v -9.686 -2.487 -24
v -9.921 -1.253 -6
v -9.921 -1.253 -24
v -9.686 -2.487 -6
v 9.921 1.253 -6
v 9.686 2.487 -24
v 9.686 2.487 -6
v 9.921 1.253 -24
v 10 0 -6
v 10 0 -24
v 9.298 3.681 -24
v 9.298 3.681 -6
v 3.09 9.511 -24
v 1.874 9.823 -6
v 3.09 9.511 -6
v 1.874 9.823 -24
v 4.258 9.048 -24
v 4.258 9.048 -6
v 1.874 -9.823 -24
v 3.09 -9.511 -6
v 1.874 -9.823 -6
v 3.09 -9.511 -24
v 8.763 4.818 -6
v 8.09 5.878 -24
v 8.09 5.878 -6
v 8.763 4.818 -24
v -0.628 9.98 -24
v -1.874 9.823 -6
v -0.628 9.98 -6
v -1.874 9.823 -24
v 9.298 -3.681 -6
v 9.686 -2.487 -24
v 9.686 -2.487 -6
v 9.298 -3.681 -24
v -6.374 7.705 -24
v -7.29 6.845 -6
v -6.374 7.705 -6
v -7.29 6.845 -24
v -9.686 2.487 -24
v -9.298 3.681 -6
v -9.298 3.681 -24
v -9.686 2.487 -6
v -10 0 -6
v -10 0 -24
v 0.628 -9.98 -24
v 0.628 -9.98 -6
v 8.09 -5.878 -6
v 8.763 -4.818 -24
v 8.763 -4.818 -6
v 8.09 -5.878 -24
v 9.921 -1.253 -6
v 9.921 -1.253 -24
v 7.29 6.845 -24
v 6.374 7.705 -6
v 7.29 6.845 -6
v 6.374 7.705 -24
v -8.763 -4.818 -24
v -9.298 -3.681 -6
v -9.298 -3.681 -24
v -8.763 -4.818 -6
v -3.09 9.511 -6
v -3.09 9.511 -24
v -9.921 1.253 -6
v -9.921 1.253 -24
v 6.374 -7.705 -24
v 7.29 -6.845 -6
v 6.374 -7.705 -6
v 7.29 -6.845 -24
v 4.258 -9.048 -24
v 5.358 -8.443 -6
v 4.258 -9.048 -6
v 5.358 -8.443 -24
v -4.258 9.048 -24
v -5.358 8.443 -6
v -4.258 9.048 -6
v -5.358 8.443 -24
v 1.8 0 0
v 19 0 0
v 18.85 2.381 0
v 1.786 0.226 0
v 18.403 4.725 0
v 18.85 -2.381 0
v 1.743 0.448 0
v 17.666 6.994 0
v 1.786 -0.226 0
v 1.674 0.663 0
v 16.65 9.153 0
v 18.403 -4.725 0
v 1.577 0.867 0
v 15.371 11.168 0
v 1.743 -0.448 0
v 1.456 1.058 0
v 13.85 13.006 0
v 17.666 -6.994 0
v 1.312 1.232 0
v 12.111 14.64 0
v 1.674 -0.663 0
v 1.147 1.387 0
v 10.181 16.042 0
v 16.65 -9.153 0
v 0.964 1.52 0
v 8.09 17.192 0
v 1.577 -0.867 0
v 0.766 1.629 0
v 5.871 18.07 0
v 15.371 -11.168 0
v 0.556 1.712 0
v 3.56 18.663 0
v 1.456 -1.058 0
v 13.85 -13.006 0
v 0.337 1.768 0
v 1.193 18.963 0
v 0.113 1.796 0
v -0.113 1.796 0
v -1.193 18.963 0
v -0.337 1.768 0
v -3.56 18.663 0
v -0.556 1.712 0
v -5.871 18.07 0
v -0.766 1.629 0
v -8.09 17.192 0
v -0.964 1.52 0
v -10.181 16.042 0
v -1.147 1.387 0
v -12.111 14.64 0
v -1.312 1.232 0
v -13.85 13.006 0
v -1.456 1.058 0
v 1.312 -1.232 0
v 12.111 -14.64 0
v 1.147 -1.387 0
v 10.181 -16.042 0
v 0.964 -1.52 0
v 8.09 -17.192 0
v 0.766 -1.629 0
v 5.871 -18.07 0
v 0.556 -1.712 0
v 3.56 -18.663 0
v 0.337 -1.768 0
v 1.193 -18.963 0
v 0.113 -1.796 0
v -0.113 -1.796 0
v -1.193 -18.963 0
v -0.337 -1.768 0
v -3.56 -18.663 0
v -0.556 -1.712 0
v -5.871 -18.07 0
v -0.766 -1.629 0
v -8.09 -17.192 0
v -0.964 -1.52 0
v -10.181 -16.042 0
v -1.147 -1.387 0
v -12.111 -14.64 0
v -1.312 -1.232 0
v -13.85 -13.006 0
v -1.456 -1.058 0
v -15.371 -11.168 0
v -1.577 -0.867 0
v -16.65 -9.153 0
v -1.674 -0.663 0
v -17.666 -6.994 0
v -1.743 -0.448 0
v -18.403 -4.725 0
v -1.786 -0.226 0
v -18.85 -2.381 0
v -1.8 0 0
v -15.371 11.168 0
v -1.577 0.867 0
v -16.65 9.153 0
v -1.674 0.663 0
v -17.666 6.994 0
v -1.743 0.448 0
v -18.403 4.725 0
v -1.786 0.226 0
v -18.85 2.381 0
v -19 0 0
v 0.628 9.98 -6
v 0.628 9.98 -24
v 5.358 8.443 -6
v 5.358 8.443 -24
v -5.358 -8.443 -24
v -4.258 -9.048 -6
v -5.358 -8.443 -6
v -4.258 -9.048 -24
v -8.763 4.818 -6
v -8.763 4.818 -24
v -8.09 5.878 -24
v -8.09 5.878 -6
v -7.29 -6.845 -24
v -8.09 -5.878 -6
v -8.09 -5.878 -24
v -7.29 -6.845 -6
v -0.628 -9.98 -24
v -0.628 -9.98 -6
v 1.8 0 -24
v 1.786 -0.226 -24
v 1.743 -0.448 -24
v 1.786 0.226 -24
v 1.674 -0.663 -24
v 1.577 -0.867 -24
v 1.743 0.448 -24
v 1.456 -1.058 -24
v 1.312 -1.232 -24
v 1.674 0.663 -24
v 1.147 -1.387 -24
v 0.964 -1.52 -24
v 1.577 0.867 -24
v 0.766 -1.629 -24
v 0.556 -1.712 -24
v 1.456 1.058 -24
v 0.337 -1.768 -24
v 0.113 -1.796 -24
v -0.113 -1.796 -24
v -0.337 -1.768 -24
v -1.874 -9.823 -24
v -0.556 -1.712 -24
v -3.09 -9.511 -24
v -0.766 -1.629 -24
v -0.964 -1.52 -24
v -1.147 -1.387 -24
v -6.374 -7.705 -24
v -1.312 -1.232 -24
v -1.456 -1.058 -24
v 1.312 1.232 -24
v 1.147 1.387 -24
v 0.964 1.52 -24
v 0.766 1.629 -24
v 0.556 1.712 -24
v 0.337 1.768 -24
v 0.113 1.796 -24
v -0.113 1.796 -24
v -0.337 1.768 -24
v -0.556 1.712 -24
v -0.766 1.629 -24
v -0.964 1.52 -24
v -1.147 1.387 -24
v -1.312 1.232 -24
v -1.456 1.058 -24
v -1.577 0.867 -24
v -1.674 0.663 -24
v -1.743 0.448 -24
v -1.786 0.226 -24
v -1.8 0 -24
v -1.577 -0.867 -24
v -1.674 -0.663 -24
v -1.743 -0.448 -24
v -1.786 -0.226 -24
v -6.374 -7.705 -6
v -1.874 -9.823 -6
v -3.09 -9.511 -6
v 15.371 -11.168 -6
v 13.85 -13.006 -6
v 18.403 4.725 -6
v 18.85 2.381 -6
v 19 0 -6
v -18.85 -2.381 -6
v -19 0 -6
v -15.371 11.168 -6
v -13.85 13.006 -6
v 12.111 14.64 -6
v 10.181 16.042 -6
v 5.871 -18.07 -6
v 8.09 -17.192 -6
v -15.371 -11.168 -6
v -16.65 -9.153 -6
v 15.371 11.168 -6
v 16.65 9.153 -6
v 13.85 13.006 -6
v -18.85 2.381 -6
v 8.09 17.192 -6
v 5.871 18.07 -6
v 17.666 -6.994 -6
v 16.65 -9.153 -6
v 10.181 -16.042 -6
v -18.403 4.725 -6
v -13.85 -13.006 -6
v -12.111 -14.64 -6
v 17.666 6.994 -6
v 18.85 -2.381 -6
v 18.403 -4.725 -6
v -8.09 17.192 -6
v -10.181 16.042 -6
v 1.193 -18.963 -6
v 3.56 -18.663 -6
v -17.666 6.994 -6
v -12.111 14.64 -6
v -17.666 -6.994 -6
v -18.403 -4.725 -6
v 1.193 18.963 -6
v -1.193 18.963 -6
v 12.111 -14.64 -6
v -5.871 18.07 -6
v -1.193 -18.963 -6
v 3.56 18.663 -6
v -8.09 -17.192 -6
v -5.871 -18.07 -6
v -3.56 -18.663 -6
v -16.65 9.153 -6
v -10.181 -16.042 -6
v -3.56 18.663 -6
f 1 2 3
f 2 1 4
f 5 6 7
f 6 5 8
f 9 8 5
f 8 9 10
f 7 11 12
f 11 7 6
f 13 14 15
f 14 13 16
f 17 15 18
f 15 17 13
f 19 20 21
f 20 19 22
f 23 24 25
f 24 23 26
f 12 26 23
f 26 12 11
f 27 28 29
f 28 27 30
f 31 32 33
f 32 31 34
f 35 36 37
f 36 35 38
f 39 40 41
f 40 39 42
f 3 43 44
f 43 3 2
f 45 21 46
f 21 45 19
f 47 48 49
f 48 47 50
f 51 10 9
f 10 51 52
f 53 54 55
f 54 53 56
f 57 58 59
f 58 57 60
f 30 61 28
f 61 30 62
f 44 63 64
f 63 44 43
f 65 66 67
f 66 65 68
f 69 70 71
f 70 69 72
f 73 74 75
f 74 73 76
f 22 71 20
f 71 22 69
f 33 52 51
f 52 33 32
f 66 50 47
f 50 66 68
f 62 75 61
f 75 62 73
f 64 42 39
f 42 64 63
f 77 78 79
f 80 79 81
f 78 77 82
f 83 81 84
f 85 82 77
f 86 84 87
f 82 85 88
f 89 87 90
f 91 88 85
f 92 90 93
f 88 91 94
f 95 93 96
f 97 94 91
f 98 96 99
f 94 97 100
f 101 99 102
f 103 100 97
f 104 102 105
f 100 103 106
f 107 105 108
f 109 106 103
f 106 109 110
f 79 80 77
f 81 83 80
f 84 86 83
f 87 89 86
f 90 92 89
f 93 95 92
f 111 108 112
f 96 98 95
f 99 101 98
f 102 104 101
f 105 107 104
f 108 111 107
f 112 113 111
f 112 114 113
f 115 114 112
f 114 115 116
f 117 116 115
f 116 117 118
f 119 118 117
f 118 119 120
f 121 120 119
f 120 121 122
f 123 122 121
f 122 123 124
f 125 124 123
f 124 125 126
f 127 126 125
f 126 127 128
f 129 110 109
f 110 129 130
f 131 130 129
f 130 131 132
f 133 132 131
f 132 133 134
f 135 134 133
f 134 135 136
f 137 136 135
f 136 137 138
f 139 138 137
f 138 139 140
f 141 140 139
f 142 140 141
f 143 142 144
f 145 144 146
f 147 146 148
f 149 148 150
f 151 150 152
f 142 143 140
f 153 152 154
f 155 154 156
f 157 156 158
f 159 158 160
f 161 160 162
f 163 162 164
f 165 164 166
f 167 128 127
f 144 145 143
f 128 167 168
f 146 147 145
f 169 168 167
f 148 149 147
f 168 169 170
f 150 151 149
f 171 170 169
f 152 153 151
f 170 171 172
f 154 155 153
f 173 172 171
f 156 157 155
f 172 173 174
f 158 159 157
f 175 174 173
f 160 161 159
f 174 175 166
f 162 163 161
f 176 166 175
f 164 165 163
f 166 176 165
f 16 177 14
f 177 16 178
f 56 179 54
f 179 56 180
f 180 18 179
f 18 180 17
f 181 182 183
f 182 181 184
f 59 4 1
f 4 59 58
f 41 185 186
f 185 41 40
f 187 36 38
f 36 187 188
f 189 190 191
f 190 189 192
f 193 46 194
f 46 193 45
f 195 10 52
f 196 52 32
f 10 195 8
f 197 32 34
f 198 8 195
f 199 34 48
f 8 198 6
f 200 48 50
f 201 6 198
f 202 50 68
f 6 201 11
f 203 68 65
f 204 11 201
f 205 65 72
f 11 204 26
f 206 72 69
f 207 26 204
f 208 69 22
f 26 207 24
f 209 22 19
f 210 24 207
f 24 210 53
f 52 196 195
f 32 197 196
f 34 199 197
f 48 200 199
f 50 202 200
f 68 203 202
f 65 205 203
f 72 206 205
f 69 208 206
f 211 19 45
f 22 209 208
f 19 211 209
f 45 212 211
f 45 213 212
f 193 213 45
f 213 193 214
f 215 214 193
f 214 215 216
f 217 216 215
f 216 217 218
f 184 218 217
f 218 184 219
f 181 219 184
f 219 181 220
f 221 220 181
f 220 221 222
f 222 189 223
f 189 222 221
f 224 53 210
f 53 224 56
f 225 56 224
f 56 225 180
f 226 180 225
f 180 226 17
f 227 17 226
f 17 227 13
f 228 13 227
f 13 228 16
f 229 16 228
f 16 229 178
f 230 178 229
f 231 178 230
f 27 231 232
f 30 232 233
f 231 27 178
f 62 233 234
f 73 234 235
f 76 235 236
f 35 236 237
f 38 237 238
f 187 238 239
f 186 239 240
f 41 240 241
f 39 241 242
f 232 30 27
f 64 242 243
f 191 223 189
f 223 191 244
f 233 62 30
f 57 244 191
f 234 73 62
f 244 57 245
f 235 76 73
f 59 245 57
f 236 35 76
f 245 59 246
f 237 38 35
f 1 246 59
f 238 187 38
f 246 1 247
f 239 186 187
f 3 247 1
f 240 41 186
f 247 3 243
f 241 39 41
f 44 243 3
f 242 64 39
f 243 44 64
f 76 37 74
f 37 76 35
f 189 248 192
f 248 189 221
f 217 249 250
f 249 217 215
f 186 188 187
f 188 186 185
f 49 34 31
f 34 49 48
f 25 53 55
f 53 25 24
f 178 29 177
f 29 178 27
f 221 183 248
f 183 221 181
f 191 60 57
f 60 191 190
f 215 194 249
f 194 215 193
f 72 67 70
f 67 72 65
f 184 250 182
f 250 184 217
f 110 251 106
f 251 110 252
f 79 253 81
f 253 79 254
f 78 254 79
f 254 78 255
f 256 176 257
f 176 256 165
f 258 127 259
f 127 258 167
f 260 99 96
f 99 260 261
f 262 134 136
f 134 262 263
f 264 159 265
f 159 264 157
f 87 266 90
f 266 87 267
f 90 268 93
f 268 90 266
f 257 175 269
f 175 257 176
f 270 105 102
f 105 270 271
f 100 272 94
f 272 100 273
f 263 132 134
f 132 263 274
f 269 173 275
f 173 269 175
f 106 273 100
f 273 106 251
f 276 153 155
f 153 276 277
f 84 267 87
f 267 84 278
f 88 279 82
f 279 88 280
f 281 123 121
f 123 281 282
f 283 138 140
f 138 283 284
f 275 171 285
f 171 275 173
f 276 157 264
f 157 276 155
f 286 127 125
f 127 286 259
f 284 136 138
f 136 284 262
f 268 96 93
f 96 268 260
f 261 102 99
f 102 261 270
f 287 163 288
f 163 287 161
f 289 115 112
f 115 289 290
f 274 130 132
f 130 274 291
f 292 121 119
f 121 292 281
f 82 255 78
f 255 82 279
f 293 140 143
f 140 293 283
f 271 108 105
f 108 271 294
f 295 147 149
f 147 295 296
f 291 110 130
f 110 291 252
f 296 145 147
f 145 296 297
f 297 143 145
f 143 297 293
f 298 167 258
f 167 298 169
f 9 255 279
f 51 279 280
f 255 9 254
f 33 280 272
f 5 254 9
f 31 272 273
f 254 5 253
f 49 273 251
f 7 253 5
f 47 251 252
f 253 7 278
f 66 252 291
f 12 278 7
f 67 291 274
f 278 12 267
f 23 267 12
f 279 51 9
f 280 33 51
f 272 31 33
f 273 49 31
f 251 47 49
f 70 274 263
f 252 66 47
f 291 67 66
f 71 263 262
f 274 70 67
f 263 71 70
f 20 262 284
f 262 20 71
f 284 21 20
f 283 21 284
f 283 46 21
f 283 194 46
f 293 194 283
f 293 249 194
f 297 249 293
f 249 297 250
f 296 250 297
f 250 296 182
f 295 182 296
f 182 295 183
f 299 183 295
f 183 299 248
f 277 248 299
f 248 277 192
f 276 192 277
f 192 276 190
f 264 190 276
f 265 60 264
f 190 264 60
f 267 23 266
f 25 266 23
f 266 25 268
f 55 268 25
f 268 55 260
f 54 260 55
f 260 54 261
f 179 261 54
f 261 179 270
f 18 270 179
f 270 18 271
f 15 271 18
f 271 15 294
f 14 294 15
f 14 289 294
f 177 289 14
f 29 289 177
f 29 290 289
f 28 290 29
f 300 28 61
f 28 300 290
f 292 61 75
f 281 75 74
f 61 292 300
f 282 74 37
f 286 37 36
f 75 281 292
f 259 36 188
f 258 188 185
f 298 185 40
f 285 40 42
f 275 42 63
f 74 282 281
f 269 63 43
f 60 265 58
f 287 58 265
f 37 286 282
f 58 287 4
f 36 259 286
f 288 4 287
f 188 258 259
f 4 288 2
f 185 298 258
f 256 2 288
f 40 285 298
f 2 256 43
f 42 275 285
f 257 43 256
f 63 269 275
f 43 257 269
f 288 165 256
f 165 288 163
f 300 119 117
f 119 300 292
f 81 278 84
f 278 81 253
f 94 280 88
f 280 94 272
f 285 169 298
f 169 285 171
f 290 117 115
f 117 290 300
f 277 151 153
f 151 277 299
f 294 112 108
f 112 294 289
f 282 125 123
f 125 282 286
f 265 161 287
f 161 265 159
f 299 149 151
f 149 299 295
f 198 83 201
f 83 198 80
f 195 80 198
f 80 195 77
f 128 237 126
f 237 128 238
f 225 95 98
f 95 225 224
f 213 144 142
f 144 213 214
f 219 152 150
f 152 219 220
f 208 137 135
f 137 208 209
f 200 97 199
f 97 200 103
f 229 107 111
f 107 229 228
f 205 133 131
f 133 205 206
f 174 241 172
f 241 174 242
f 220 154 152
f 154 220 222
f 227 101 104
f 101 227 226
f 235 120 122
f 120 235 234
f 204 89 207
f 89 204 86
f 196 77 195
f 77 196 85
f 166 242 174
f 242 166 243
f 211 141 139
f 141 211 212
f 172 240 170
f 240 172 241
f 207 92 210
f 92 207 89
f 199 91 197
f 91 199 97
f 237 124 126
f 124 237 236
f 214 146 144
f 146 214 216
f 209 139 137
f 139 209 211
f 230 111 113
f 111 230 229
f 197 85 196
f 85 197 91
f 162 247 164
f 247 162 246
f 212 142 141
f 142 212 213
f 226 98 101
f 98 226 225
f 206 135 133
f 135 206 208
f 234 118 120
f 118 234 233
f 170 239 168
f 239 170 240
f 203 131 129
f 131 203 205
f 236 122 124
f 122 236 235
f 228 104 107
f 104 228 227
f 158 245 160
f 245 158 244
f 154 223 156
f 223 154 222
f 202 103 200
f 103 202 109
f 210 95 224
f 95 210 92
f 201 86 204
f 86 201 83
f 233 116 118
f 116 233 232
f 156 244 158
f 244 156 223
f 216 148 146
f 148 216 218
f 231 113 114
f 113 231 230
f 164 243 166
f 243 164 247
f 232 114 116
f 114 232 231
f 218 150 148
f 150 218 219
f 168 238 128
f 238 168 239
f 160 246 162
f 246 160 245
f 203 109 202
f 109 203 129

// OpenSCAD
$fn = 50;


difference() {
	union() {
		translate(v = [0, 0, -24.0000000000]) {
			cylinder(h = 24, r = 10.0000000000);
		}
		translate(v = [0, 0, -6.0000000000]) {
			cylinder(h = 6, r = 19.0000000000);
		}
	}
	union() {
		#translate(v = [0, 0, -24]) {
			cylinder(h = 24, r = 1.8000000000);
		}
	}
}
